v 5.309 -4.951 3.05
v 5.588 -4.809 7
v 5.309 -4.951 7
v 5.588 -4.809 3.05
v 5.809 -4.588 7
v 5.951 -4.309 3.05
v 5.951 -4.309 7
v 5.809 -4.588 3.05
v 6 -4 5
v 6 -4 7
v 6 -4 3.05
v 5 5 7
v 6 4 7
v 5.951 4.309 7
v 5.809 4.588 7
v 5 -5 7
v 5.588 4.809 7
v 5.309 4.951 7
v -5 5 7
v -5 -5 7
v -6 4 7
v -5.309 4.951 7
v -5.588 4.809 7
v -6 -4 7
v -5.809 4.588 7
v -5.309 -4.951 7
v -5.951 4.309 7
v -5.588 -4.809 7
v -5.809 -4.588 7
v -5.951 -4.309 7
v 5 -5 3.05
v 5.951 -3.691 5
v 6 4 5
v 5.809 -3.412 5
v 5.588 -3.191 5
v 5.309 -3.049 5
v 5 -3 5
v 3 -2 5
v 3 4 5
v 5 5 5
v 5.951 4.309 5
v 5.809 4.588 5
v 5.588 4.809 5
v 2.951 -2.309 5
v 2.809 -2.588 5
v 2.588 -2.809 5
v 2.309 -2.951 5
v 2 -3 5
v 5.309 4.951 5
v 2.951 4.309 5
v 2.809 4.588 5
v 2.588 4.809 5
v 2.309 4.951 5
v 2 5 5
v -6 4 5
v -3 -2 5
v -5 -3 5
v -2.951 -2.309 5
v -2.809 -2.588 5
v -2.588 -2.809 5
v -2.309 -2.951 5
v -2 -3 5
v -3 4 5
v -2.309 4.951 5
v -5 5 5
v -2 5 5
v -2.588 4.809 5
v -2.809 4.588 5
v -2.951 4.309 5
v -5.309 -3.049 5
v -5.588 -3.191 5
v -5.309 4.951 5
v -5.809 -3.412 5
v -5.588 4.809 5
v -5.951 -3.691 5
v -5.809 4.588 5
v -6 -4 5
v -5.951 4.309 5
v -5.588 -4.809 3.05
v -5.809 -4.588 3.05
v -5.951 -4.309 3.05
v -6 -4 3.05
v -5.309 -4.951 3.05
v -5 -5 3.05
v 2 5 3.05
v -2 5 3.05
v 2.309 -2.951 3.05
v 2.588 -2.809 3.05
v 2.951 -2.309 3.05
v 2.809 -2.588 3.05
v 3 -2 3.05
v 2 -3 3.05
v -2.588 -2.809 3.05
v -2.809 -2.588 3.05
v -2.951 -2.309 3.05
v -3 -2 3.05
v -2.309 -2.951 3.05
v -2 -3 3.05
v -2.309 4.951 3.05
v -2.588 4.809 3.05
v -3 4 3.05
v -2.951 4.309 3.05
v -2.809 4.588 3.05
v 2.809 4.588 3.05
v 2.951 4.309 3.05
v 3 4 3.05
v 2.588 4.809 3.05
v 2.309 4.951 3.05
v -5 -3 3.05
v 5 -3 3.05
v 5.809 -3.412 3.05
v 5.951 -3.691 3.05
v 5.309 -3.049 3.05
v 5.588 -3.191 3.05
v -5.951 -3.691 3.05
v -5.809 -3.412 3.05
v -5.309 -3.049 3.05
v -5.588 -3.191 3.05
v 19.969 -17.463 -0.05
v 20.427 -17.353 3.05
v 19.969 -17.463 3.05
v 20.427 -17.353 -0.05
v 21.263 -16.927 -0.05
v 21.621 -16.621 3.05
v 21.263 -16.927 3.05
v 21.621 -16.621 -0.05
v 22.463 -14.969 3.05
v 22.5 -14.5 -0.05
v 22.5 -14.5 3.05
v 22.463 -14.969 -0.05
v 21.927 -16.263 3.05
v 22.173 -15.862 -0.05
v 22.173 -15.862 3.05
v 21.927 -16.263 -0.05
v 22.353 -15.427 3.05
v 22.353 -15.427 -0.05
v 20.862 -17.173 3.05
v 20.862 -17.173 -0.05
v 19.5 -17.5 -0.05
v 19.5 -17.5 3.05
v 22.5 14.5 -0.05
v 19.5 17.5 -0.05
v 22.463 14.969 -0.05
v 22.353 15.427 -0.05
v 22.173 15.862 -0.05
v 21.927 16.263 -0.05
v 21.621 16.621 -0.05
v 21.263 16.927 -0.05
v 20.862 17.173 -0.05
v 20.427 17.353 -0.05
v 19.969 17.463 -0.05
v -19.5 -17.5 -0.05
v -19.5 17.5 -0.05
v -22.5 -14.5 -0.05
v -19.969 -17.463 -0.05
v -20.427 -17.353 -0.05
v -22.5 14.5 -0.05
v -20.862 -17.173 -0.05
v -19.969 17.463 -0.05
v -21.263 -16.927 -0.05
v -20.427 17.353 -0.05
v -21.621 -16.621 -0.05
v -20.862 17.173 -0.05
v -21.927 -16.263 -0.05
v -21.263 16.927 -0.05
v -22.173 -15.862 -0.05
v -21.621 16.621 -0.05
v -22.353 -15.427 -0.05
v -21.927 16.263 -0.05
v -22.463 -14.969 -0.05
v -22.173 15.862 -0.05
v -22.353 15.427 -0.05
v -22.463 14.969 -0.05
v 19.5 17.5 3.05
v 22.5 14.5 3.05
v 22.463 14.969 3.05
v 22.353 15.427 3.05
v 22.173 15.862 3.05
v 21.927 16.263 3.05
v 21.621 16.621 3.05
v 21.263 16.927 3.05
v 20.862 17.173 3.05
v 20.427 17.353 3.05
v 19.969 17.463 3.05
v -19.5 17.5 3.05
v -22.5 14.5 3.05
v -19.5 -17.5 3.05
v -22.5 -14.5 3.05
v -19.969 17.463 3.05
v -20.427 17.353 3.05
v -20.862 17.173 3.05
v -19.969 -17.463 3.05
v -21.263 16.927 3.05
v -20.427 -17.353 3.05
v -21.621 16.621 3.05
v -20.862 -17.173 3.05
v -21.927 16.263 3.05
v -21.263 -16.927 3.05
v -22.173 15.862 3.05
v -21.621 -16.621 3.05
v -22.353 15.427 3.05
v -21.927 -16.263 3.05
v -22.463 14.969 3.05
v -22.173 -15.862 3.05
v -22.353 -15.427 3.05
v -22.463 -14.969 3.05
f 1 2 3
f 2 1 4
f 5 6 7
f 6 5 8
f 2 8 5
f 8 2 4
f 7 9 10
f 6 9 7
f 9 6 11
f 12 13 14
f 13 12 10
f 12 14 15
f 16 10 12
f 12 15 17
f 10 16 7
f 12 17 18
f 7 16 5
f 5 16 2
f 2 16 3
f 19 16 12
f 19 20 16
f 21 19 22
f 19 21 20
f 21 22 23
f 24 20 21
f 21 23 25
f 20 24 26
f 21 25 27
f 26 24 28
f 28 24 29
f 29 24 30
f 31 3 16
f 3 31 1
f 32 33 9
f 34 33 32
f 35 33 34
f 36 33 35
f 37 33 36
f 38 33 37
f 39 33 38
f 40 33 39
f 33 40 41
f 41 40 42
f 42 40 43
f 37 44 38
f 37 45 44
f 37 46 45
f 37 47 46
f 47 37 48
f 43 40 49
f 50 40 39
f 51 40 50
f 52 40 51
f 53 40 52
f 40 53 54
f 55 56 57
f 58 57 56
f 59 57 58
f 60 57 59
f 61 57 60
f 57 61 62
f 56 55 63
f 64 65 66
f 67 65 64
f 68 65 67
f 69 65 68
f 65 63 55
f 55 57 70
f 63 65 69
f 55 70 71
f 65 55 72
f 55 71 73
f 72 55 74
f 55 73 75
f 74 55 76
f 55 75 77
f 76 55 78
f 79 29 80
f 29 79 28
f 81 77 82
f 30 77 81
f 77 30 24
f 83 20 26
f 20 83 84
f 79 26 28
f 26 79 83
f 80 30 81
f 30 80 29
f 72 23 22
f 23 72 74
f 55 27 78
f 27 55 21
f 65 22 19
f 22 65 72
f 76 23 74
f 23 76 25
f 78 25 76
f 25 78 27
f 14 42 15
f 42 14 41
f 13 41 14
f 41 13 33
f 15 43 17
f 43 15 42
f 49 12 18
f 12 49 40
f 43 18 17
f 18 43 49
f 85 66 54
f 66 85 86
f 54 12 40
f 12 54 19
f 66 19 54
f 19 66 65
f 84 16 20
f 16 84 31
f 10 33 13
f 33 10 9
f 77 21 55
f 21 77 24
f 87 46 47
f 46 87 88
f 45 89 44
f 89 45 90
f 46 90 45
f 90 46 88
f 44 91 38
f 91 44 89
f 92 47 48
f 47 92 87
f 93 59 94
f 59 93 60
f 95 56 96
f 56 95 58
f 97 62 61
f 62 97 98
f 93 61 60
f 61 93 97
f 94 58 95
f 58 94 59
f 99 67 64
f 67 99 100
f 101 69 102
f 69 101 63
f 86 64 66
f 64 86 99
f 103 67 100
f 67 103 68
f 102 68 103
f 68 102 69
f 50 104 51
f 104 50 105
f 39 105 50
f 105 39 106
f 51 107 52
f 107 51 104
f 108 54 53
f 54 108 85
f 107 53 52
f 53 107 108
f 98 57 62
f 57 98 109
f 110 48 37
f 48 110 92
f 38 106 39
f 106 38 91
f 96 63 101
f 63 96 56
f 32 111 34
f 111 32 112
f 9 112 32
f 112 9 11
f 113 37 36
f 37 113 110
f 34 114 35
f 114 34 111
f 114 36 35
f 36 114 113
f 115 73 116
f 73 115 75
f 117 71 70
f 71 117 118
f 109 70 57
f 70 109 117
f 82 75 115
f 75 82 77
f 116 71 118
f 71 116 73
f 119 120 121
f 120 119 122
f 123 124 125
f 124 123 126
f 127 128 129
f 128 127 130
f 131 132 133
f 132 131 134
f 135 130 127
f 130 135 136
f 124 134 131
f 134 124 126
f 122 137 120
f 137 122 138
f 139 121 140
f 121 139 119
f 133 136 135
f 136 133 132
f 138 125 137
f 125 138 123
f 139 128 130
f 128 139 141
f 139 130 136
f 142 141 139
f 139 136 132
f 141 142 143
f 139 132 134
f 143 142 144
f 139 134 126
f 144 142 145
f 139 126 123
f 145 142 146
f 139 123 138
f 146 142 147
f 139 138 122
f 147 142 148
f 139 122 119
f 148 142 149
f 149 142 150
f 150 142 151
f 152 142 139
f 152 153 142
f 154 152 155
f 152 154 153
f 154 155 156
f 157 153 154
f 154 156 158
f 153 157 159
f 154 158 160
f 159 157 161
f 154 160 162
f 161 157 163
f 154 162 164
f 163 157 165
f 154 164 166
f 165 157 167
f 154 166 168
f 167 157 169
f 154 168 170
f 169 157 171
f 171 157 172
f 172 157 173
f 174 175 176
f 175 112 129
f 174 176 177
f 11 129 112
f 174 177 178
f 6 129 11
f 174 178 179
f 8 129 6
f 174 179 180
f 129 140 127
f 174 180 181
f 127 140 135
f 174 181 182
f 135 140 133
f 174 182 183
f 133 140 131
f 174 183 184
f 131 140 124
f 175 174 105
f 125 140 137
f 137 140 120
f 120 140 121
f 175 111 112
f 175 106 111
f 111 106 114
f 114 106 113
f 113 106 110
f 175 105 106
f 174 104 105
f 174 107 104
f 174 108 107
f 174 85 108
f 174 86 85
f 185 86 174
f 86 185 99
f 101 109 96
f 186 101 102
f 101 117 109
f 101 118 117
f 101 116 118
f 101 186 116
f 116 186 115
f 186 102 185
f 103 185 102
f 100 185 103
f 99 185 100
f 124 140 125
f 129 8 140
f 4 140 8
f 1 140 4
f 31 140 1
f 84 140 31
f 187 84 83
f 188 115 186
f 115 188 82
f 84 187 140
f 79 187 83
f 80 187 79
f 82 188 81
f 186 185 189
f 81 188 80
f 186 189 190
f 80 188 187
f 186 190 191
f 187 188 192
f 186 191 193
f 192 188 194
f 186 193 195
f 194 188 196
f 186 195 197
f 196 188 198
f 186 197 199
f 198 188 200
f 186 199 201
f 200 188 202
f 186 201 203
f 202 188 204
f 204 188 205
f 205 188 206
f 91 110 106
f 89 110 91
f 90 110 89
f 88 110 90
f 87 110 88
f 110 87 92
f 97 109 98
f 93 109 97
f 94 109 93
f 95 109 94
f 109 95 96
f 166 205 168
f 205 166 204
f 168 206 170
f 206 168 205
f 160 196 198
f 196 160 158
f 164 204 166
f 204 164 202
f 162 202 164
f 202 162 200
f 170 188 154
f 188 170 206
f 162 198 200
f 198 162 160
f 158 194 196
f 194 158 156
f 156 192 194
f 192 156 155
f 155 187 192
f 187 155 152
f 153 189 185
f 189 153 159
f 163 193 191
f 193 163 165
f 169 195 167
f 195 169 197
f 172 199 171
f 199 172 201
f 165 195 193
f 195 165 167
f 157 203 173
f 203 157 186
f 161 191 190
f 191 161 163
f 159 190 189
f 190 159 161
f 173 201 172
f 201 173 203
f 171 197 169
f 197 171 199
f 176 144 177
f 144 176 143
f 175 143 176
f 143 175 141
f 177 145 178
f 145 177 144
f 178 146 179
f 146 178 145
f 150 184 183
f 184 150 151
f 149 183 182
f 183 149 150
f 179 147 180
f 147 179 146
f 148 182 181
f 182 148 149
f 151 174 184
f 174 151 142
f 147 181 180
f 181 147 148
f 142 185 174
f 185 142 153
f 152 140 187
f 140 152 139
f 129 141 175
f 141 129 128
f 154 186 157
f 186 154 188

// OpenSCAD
/* [Global] */

/* [Left-To-Right Adjustment] */

// Angle to tilt camera left-to-right, in degrees. Positive makes camera point right, negative points left
Angle_X = 0; // [-90:90]

// Higher numbers create more rounded angles, at the cost of a higher STIL file size. 100 is sufficient for most use cases.
Angle_X_Smoothing = 100; // [30:200]

/* [Ground-To-Sky Adjustment] */

// Angle to tilt camera ground-to-sky, in degrees. Positive makes camera point towards ground; negaitve points towards sky.
Angle_Y = 0; // [-90:90]

// Higher numbers create more rounded angles, at the cost of a higher STIL file size. 100 is sufficient for most use cases.
Angle_Y_Smoothing = 100; // [30:200]

/* [Standoffs] */

// Extra width to place on camera side, in mm. Reference: thin mount is 3mm, thick mount is 5mm
Camera_Standoff = 3; // [3:100]

// Extra width to place in between angled sections, in mm
Angle_Standoff = 0;

//Extra width to place on windshield side, in mm
Windshield_Standoff = 0;

/* [Miscellaneous] */

// True makes left-to-right adjustments apply on camera side, and ground-to-sky adjustments apply on windshield side. False reverses this.
Angle_X_Camera_Side = true;

/* [Hidden] */

Base_X = 45; //  Base X size of OEM mount, in mm
Base_Y = 35; //  Base Y size of OEM mount, in mm
Standoff_Tolerance = 0.1;
Half_Base_X = Base_X / 2;
Half_Base_Y = Base_Y / 2;
Double_Base_X = Base_X * 2;
Double_Base_Y = Base_Y * 2;
Double_Standoff_Tolerance = Standoff_Tolerance * 2;
Half_Camera_Standoff = Camera_Standoff / 2;
Half_Angle_Standoff = Angle_Standoff / 2;
Half_Windshield_Standoff = Windshield_Standoff / 2;
Sign_X = Angle_X == 0 ? 0 : abs(Angle_X) / Angle_X; //Angle_X: -1 for negative, 0 for 0, 1 for positive
Sign_Y = Angle_Y == 0 ? 0 : abs(Angle_Y) / Angle_Y; //Angle_Y: -1 for negative, 0 for 0, 1 for positive 

module Round_Rect(x, y, z, r, s)
{
	union()
	{
		translate([(x / 2) - r, ((-y) / 2) + r, 0])
			cylinder(z, r, r, center = true, $fn = s);
		translate([((-x) / 2) + r, ((-y) / 2) + r, 0])
			cylinder(z, r, r, center = true, $fn = s);
		translate([((-x) / 2) + r, (y / 2) - r, 0])
			cylinder(z, r, r, center = true, $fn = s);
		translate([(x / 2) - r, (y / 2) - r, 0])
			cylinder(z, r, r, center = true, $fn = s);
		cube([x - (r * 2), y, z], center = true);
		cube([x, y - (r * 2), z], center = true);
	}
}

module Make_Mount()
{
	//
	// Main mount
	//
	union()
	{
		//
		// Hook mechanism for dash cam
		//
		translate([0, 0, 1 + Camera_Standoff])
		union()
		{
			//
			// Flat top of hook
			//
			translate([0, 0, 2])
				Round_Rect(12, 10, 2, 1, 20);

			//
			// Thin inside of hook
			//
			translate([0, 1, 0])
				Round_Rect(6, 8, 2, 1, 20);

			//
			// Stopper of hook
			//
			translate([0, (-4), 0])
				Round_Rect(12, 2, 2, 1, 20);
		}

		//
		// Camera standoff
		//
		translate([0, 0, Camera_Standoff / 2])
			Round_Rect(Base_X, Base_Y, Camera_Standoff + Standoff_Tolerance, 3, 40);
	}
}

module Make_Angle_X()
{
	//
	// Angle X
	//
	difference()
	{
		rotate([90, 0, 0])
			cylinder(Base_Y, Base_X, Base_X, center = true, $fn = Angle_X_Smoothing);

		translate([0, 0, (-Half_Base_X)])
			cube([Double_Base_X, Base_Y + Standoff_Tolerance, Base_X], center = true);

		rotate([0, (-Angle_X), 0])
		translate([0, 0, Half_Base_X])
			cube([Double_Base_X, Base_Y + Standoff_Tolerance, Base_X], center = true);
	};
}

module Make_Angle_Y()
{
	//
	// Angle Y
	//
	difference()
	{
		rotate([0, 90, 0])
			cylinder(Base_X, Base_Y, Base_Y, center = true, $fn = Angle_Y_Smoothing);

		translate([0, 0, (-Half_Base_Y)])
			cube([Base_X + Standoff_Tolerance, Double_Base_Y, Base_Y], center = true);

		rotate([(-Angle_Y), 0, 0])
		translate([0, 0, Half_Base_Y])
			cube([Base_X + Standoff_Tolerance, Double_Base_Y, Base_Y], center = true);
	};
}

module Make_Angle_First()
{
	// SANITY CHECK: If angle to make is zero, don't do anything here
	if ((Angle_X_Camera_Side && Angle_X == 0) ||
		(!Angle_X_Camera_Side && Angle_Y == 0))
	{
		Make_Mount();
	}
	else
	{
		union()
		{
			if (Angle_X_Camera_Side)
			{
				//
				// Move unioned result back to origin
				//
				translate([Sign_X * (-Half_Base_X), 0, 0])
				union()
				{
					//
					// Make parts here and union together
					//
					rotate([0, (-Angle_X), 0])
					translate([Sign_X * Half_Base_X, 0, 0])
						Make_Mount();

					Make_Angle_X();
				}
			}
			else
			{
				//
				// Move unioned result back to origin
				//
				translate([0, Sign_Y * Half_Base_Y, 0])
				union()
				{
					//
					// Make parts here and union together
					//
					rotate([(-Angle_Y), 0, 0])
					translate([0, Sign_Y * (-Half_Base_Y), 0])
						Make_Mount();

					Make_Angle_Y();
				}
			}
		}
	}
}

module Make_Angle_Standoff()
{
	//
	// Move unioned result back to origin
	//
	translate([0, 0, Angle_Standoff])
	union()
	{
		//
		// Make parts here and union together
		//
		Make_Angle_First();


		// Only make standoff if required
		if (Angle_Standoff != 0)
		{
			//
			// Angle standoff
			//
			translate([0, 0, (-Half_Angle_Standoff) - Standoff_Tolerance])
				cube([Base_X, Base_Y, Angle_Standoff + Double_Standoff_Tolerance], center = true);
		}
	}
}

module Make_Angle_Second()
{
	// SANITY CHECK: If angle to make is zero, don't do anything here
	if ((!Angle_X_Camera_Side && Angle_X == 0) ||
		(Angle_X_Camera_Side && Angle_Y == 0))
	{
		Make_Angle_Standoff();
	}
	else
	{
		union()
		{
			if (Angle_X_Camera_Side)
			{
				//
				// Move unioned result back to origin
				//
				translate([0, Sign_Y * Half_Base_Y, 0])
				union()
				{
					//
					// Make parts here and union together
					//
					rotate([(-Angle_Y), 0, 0])
					translate([0, Sign_Y * (-Half_Base_Y), 0])
						Make_Angle_Standoff();

					Make_Angle_Y();
				}
			}
			else
			{
				//
				// Move unioned result back to origin
				//
				translate([Sign_X * (-Half_Base_X), 0, 0])
				union()
				{
					//
					// Make parts here and union together
					//
					rotate([0, (-Angle_X), 0])
					translate([Sign_X * Half_Base_X, 0, 0])
						Make_Angle_Standoff();

					Make_Angle_X();
				}
			}
		}
	}
}

module Make_Windshield_Standoff()
{
	//
	// Move unioned result back to origin
	//
	translate([0, 0, Windshield_Standoff])
	union()
	{
		//
		// Make parts here and union together
		//
		Make_Angle_Second();


		// Only make standoff if required
		if (Windshield_Standoff != 0)
		{
			//
			// Windshield standoff
			//
			translate([0, 0, (-Half_Windshield_Standoff)])
				cube([Base_X, Base_Y, Windshield_Standoff + Standoff_Tolerance], center = true);
		}
	}
}

//
// Convenient wrapper method for clarity
//
module Make_All()
{
	Make_Windshield_Standoff();
}

Make_All();;
